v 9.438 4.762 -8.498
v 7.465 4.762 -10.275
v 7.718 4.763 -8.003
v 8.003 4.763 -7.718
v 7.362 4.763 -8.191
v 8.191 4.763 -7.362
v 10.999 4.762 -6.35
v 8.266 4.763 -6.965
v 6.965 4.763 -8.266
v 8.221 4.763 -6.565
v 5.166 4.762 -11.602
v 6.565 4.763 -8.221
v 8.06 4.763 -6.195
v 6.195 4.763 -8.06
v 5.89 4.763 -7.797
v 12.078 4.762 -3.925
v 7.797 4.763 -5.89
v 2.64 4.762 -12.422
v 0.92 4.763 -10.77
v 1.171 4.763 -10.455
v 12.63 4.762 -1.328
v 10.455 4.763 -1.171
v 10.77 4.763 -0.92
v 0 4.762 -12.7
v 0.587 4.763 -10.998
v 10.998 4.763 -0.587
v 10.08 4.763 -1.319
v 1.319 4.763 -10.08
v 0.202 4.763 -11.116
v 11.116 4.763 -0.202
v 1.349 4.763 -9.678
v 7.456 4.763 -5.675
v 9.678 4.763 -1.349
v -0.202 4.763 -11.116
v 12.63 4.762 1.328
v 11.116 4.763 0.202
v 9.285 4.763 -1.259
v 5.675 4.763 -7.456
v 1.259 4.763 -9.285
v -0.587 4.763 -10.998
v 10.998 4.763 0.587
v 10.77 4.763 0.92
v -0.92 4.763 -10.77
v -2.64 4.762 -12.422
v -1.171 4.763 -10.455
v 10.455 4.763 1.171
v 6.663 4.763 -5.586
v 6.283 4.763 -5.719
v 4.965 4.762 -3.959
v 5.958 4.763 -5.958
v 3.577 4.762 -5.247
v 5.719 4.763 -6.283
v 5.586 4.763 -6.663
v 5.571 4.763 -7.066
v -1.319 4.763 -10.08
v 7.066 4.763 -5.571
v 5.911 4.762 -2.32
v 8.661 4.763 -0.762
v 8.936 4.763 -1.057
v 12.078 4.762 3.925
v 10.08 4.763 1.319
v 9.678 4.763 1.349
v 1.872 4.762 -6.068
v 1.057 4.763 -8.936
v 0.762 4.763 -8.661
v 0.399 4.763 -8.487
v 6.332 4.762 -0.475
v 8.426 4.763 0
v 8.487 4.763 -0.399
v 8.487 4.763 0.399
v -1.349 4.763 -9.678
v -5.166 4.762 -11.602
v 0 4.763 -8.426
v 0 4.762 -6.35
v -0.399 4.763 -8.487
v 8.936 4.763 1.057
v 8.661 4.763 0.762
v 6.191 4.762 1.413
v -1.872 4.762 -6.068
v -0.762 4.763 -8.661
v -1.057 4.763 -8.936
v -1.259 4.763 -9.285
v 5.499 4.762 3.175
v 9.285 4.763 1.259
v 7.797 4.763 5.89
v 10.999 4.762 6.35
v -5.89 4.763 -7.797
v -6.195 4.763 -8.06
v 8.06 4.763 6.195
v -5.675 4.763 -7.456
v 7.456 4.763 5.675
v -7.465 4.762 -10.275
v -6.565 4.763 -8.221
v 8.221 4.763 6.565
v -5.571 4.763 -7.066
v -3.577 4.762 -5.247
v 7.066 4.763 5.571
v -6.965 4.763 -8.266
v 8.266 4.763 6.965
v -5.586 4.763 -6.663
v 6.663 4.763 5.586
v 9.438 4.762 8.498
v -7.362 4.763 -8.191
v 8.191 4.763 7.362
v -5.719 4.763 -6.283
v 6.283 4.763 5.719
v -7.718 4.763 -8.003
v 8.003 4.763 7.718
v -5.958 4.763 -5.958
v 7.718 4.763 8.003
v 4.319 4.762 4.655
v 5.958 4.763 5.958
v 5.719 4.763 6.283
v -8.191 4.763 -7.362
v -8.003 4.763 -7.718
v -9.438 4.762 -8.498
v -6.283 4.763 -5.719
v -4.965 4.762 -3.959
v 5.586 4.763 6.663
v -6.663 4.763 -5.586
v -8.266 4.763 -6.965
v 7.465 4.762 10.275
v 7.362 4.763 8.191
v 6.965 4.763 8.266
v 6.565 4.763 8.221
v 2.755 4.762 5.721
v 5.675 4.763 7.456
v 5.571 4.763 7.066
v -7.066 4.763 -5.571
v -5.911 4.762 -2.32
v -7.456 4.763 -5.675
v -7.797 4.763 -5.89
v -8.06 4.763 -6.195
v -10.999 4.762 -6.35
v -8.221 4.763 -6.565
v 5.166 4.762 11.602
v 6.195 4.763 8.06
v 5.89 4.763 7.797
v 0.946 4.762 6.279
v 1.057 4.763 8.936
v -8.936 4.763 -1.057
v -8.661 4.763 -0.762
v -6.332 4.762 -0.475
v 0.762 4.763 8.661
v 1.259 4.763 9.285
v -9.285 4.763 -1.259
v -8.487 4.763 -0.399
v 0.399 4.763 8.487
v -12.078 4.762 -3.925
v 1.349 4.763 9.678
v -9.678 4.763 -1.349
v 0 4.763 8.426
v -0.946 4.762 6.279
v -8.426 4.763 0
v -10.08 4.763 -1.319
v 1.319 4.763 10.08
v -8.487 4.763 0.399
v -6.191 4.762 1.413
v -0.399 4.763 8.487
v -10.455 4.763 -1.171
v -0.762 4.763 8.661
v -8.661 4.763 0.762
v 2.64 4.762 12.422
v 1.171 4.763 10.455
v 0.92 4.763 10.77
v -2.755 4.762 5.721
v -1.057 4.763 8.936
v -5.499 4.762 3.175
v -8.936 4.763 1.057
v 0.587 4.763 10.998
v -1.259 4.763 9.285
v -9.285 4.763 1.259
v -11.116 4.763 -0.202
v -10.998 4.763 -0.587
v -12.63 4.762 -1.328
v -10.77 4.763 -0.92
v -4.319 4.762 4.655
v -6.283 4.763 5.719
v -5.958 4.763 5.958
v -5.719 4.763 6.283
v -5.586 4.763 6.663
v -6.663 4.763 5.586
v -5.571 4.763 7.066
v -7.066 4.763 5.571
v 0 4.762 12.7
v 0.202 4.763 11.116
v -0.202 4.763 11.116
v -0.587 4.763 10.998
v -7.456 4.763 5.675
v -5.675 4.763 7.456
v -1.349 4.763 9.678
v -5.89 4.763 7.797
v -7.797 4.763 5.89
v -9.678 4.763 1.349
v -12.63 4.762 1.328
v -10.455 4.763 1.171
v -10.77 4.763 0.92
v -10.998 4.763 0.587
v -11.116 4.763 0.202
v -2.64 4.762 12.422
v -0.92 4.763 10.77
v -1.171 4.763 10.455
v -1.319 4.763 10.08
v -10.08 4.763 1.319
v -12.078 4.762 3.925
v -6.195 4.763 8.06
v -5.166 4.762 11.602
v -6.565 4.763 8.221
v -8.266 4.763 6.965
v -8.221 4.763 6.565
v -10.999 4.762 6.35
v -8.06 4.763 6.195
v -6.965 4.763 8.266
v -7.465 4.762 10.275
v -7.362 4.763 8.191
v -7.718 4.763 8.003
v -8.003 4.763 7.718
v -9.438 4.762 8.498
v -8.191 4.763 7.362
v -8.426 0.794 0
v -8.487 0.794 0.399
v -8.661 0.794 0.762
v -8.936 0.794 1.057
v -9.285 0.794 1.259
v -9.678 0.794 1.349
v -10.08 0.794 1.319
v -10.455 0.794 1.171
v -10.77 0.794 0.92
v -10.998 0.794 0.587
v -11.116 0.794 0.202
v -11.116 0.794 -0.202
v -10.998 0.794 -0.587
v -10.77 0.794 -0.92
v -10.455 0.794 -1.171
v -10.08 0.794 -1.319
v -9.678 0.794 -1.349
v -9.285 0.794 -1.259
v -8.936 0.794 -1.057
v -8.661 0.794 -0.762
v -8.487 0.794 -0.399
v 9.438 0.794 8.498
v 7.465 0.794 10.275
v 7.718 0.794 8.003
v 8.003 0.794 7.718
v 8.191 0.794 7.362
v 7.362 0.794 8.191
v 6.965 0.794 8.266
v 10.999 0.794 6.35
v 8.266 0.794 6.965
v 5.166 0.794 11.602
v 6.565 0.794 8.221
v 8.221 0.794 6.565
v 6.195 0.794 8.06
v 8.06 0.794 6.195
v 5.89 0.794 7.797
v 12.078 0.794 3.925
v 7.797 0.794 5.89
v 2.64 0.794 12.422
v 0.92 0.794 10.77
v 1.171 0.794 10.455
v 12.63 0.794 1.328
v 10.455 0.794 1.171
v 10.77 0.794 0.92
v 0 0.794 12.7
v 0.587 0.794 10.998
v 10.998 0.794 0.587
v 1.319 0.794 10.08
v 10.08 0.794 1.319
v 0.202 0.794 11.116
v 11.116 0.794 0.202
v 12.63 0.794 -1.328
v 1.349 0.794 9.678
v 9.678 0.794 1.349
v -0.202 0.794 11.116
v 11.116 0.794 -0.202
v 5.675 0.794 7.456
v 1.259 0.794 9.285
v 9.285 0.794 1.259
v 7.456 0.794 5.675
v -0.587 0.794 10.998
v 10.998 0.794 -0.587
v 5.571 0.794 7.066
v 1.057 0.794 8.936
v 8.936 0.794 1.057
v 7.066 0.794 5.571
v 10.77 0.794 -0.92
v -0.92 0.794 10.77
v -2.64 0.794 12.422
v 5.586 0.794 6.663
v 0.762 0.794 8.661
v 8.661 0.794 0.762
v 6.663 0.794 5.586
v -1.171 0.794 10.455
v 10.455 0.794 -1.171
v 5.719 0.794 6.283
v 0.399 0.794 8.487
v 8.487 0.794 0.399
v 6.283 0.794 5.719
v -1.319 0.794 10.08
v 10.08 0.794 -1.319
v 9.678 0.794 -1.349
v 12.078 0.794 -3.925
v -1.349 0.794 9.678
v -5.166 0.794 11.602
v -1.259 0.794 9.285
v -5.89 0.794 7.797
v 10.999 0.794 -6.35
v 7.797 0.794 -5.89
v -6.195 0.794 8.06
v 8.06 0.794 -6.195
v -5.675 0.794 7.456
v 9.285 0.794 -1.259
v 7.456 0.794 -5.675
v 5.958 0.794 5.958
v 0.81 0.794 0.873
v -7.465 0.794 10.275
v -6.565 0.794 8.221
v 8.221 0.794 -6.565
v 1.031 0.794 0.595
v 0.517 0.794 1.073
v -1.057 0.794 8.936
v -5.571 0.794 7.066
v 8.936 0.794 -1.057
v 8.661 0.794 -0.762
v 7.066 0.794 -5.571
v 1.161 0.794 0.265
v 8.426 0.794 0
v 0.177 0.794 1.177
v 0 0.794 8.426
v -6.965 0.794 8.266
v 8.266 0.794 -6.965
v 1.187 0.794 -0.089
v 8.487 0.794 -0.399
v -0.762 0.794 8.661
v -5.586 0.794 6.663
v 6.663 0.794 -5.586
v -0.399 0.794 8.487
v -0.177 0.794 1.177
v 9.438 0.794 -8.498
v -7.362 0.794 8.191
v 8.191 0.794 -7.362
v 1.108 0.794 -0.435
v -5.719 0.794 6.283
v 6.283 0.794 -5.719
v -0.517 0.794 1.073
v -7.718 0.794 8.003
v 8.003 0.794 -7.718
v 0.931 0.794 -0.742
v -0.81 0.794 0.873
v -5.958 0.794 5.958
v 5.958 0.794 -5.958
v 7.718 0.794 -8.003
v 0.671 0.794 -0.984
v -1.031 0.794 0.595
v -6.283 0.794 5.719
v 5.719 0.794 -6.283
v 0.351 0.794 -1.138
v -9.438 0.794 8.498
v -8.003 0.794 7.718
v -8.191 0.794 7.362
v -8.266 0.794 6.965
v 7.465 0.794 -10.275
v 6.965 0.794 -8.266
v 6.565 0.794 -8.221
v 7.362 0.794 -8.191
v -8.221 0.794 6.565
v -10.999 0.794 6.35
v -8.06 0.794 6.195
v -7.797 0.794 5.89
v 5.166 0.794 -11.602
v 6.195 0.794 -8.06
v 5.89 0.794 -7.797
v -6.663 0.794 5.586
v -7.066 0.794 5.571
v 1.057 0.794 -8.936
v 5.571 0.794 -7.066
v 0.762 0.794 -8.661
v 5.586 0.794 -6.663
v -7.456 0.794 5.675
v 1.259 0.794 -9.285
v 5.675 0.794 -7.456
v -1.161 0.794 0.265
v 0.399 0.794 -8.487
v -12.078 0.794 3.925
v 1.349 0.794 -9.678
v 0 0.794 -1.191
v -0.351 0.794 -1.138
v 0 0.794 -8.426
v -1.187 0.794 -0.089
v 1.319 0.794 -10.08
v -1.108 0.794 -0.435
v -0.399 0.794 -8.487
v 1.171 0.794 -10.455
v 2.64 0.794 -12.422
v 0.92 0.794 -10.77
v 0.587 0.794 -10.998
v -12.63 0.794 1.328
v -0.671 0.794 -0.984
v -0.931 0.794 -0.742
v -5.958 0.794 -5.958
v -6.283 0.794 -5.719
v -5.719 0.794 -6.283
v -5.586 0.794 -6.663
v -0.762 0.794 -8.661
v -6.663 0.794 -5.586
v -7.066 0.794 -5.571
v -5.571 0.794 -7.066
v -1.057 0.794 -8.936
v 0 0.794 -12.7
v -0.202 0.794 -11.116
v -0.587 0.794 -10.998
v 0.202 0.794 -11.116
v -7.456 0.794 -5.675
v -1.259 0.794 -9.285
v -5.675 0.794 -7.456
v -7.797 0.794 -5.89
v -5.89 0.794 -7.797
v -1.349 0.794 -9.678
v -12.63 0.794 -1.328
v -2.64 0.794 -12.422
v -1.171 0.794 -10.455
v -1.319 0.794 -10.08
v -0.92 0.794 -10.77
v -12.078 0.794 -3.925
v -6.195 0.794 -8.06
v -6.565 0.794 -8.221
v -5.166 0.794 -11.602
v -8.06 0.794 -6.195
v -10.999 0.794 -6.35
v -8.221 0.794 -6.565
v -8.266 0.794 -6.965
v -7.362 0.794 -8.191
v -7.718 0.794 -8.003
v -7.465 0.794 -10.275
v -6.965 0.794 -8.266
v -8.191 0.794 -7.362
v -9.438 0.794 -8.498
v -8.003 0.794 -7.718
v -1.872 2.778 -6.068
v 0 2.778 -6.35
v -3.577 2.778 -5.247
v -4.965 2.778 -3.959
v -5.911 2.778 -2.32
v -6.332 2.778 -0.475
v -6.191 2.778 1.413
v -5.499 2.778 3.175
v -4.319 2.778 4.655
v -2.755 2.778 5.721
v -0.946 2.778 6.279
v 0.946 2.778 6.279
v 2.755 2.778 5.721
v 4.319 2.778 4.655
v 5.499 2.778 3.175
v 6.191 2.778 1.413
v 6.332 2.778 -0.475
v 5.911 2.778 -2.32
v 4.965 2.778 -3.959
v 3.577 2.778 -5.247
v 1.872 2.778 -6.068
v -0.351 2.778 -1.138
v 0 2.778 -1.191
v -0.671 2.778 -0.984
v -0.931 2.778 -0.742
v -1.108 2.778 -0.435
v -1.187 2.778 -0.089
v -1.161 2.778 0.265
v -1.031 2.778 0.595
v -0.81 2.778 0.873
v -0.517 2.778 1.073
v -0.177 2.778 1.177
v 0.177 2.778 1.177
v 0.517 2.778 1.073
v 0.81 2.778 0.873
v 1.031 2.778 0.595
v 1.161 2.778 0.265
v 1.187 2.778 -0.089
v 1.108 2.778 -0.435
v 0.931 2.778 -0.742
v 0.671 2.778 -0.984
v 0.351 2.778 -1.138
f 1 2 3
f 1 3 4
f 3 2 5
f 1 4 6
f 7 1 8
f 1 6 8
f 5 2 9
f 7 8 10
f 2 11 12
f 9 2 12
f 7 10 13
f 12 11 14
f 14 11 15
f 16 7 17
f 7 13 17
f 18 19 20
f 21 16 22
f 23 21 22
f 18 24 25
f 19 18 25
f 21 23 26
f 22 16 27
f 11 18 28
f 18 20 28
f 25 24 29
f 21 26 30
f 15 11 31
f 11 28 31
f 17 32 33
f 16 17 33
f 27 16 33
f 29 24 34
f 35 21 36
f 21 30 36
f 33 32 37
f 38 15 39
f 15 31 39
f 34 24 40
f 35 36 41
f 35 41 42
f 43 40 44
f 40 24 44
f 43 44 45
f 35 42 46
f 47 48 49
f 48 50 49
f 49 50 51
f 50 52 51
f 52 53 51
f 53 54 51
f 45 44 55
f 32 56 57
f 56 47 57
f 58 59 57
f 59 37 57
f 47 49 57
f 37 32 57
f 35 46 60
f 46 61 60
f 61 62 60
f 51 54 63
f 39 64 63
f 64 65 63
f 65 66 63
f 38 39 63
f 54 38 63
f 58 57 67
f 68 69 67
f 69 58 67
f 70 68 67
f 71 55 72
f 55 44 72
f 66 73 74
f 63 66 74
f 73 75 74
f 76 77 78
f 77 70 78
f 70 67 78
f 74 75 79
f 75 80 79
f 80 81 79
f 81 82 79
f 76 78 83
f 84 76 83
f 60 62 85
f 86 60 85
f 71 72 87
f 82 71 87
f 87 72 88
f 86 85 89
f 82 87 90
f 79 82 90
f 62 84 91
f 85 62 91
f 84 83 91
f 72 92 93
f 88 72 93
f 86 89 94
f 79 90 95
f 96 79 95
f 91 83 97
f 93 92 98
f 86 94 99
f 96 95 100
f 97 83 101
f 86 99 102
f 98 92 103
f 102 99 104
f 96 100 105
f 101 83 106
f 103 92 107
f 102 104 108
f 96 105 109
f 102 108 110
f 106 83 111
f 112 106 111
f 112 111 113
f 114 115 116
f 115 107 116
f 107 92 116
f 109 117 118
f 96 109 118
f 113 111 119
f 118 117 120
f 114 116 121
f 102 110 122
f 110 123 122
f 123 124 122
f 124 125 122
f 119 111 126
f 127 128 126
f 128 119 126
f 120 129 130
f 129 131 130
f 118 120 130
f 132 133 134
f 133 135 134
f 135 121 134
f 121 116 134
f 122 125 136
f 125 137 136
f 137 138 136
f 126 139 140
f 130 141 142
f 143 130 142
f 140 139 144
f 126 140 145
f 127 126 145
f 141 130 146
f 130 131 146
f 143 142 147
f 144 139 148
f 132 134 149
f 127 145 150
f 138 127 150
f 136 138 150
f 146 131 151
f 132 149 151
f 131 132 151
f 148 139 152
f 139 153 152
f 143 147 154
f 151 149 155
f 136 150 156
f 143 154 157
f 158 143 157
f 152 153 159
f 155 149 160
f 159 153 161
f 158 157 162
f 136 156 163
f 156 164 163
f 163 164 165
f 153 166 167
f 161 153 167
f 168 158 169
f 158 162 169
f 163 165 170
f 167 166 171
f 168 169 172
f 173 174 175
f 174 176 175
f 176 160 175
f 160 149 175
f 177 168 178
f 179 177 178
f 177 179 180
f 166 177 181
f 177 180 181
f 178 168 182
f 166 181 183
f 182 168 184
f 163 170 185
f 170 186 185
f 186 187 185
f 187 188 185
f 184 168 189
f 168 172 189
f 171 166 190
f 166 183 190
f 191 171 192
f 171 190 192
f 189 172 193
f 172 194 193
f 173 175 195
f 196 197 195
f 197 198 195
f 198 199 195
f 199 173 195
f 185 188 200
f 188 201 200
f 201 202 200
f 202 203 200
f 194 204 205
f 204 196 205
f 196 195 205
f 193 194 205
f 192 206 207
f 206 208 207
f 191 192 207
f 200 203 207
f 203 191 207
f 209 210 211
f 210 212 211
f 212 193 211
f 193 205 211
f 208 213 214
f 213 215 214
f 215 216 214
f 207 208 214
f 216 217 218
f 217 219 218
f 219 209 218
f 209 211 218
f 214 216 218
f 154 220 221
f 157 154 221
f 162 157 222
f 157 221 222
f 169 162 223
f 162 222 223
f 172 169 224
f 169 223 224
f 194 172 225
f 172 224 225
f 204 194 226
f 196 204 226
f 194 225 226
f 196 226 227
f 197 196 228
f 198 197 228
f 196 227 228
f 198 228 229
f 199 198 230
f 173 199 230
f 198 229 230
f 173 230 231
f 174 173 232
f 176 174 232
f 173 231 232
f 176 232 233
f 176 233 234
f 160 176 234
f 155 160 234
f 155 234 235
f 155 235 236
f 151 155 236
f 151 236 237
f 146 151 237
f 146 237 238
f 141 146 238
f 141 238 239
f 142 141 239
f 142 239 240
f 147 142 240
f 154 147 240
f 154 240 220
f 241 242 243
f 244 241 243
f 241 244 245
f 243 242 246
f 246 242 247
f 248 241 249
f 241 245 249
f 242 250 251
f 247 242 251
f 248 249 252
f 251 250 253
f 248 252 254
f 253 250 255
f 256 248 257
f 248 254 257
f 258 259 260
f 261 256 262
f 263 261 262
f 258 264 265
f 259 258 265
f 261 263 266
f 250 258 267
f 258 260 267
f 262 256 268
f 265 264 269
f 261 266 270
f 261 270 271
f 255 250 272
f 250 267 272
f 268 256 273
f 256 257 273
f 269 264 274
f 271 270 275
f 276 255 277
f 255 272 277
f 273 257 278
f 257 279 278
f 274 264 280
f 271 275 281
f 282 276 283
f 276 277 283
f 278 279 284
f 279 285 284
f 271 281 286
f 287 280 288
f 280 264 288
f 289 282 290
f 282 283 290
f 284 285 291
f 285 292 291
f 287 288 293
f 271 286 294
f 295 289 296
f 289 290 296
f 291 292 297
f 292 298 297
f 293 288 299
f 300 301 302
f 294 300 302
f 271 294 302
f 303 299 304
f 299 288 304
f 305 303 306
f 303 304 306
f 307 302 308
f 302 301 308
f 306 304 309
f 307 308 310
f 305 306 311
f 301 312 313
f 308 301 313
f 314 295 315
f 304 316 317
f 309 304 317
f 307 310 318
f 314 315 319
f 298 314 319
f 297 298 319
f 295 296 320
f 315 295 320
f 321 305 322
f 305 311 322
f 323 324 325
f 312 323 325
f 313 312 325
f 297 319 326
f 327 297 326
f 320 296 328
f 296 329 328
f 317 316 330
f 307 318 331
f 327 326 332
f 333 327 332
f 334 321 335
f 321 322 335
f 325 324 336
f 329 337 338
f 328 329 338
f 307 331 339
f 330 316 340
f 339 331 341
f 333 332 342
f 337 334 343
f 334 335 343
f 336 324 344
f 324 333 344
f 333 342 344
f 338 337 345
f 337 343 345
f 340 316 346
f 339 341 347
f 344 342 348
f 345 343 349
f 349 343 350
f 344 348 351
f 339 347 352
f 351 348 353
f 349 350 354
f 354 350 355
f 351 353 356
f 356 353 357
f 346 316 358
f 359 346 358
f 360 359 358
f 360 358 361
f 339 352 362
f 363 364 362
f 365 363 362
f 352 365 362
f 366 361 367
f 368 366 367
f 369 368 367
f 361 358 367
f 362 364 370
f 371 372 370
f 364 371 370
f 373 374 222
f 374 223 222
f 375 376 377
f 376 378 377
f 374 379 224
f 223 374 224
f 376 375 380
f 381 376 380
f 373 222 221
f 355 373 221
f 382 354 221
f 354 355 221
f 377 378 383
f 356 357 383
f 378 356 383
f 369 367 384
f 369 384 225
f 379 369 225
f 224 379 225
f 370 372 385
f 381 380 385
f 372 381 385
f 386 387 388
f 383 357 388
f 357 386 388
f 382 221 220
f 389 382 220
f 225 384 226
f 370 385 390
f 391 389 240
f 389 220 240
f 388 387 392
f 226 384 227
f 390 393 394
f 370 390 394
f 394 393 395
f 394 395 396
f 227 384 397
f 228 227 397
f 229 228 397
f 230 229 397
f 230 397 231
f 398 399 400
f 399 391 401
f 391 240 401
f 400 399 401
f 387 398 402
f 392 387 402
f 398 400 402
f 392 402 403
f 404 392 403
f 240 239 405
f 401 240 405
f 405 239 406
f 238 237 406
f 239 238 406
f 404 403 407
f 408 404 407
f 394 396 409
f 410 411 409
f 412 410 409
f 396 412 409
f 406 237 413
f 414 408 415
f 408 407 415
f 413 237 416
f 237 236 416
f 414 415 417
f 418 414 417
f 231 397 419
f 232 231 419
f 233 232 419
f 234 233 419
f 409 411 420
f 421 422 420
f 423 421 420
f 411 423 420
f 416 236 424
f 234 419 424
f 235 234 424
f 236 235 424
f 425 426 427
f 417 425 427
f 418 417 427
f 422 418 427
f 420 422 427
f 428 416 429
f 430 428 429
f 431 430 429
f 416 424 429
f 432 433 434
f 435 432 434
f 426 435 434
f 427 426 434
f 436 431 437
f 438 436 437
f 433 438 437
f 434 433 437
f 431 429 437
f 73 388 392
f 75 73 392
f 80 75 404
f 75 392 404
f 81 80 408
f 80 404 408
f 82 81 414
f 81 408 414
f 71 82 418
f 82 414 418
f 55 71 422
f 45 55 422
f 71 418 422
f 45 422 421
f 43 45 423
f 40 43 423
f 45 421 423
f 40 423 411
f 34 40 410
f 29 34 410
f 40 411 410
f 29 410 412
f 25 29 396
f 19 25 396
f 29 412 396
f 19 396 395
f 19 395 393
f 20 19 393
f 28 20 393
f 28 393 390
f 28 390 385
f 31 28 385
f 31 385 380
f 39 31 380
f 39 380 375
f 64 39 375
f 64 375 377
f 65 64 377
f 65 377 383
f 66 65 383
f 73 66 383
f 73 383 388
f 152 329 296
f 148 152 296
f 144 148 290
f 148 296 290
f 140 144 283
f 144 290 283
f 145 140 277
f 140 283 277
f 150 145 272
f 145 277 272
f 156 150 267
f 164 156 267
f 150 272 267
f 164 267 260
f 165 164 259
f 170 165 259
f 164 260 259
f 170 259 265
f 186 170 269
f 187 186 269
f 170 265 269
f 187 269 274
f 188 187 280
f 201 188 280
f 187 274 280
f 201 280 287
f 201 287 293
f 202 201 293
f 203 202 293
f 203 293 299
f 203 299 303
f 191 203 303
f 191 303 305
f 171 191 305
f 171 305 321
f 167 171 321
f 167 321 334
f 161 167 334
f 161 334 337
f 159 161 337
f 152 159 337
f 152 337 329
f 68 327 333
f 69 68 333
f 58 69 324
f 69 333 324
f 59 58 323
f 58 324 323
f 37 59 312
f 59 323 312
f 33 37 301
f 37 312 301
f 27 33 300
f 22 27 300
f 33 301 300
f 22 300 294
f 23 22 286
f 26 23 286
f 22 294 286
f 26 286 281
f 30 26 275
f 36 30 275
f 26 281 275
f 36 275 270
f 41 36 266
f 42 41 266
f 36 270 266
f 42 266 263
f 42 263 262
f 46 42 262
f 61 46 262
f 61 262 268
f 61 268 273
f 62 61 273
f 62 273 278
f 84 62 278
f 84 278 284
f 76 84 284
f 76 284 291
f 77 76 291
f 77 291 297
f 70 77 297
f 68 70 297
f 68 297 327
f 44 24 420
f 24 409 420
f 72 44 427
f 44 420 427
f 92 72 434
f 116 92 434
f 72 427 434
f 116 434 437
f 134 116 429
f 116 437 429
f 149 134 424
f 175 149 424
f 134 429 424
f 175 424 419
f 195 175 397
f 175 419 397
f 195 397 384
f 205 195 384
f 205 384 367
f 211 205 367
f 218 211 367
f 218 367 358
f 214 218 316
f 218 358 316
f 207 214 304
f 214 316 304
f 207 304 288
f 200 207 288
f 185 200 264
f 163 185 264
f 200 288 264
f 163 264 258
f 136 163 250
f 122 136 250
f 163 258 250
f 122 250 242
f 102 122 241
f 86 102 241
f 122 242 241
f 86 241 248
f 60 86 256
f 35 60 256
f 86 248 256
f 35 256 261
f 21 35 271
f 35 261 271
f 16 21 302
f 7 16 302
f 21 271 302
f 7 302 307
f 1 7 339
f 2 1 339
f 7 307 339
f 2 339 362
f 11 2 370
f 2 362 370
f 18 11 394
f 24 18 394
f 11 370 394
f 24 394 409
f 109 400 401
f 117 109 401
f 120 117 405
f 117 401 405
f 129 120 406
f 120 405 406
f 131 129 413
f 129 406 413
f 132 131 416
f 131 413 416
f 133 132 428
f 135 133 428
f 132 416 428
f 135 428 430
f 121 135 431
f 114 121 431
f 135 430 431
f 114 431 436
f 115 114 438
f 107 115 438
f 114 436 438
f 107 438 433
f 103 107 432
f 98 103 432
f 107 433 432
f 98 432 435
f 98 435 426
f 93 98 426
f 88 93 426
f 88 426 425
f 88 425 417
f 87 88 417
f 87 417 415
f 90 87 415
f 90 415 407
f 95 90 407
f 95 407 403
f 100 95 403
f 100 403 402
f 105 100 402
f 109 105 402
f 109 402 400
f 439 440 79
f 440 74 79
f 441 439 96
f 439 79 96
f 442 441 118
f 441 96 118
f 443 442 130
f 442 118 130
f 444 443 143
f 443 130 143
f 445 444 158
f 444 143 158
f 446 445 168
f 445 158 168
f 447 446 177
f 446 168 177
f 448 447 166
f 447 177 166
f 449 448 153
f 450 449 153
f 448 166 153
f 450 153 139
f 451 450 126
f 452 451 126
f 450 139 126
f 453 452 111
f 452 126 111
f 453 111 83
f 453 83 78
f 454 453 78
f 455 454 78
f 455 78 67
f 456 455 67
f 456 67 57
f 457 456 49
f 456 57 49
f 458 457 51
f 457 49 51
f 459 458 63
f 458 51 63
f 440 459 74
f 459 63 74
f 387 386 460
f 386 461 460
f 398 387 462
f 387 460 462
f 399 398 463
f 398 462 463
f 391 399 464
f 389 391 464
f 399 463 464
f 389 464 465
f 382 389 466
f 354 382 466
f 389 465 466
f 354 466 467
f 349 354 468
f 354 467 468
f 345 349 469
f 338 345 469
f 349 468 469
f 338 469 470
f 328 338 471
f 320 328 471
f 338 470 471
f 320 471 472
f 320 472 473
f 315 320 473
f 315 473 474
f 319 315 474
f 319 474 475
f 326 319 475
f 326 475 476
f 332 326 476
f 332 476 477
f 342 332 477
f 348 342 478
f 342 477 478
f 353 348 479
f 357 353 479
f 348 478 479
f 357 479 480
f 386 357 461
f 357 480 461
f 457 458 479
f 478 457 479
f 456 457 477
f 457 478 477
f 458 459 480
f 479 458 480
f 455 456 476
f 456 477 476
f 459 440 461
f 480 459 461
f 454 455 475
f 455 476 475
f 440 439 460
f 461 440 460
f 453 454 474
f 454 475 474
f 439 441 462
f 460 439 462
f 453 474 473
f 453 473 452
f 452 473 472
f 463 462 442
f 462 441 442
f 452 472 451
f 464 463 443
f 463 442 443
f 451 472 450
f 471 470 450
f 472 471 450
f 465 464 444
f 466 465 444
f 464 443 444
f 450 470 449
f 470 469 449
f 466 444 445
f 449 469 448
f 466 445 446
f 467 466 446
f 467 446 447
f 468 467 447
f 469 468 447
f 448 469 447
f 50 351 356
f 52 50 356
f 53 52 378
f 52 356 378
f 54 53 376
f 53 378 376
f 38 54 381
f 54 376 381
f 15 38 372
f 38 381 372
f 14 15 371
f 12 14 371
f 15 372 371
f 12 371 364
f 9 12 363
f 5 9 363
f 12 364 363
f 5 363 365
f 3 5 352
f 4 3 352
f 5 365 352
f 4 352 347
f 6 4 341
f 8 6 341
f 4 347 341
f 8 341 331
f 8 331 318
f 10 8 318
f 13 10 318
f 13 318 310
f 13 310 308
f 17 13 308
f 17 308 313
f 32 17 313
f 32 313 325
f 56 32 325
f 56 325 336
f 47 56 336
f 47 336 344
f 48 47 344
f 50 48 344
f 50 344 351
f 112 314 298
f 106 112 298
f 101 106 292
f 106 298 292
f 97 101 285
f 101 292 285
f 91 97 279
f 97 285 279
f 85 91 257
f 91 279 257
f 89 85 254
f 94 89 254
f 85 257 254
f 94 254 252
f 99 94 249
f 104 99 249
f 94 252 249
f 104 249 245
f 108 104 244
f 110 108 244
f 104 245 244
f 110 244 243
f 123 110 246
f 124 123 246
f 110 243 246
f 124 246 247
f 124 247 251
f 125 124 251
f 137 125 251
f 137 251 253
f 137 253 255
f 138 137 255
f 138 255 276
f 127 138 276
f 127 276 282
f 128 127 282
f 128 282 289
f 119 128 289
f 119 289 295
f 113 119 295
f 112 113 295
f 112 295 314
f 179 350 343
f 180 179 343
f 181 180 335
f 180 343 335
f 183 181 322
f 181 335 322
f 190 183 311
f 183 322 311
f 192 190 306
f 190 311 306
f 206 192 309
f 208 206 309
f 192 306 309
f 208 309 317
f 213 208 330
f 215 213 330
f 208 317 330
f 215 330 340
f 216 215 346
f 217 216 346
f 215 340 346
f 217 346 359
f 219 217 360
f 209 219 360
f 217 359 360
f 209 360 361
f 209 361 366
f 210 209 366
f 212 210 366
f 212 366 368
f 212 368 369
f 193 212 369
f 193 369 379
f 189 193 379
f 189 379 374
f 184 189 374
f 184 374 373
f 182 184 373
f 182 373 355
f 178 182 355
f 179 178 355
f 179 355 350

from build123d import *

# Parameters (mm, degrees)
F_6_32_TAPPED_HOLE1_D = 2.7051
CIRPATTERN1_COUNT     = 8


with BuildPart() as part:
    # Sketch1 → Revolve1 (revolve)
    with BuildSketch(Plane.XY, mode=Mode.PRIVATE) as revolve1_sk:
        Polygon((-12.7, 4.7625), (-12.7, 0.79375), (-1.190625, 0.79375), (-1.190625, 2.778125), (-6.35, 2.778125), (-6.35, 4.7625), align=None)
    revolve(revolve1_sk.sketch.rotate(Axis((0, 0, 0), (0, 1, 0)), 270), axis=Axis((0, 0, 0), (0, 1, 0)))

    # #6-32 Tapped Hole1 (through all)
    with Locations(Plane(origin=(0, 4.7625, 0), x_dir=(1, 0, 0), z_dir=(0, 1, 0))):
        with Locations((9.779, 0)):
            f_6_32_tapped_hole1 = Hole(F_6_32_TAPPED_HOLE1_D / 2)

    # CirPattern1: #6-32 Tapped Hole1 ×8 about axis
    cirpattern1_axis = Axis((0, 0, 0), (0, 1, 0))
    for i in range(1, CIRPATTERN1_COUNT):
        add(f_6_32_tapped_hole1.rotate(cirpattern1_axis, i * 360 / CIRPATTERN1_COUNT), mode=Mode.SUBTRACT)


solid = part.part
